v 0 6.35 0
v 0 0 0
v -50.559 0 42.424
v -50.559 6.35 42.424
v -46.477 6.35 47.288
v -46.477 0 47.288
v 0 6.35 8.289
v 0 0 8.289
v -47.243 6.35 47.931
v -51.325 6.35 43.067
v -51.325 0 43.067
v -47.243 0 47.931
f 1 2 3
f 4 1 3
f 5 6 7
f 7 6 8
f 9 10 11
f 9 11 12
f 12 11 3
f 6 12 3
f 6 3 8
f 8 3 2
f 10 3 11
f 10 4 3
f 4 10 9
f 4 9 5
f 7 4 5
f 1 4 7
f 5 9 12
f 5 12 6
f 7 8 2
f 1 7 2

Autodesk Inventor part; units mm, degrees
ref_plane "YZ Plane" through (0, 0, 0) normal (1, 0, 0) x (0, 1, 0)
ref_plane "XZ Plane" through (0, 0, 0) normal (0, 1, 0) x (-1, 0, 0)
ref_plane "XY Plane" through (0, 0, 0) normal (0, 0, 1) x (1, 0, 0)
sketch "Sketch1" plane through (0, 0, 0) normal (0, 1, 0) x (-1, 0, 0)
  line L0 (0, 0) -> (58.9854, 49.4946)
  line L1 (0, 0) -> (77, 0) construction
  line L2 (58.9854, 49.4946) -> (54.9037, 54.359)
  line L3 (54.9037, 54.359) -> (0, 8.2893)
  line L4 (0, 8.2893) -> (0, 0)
  dimension "d0" = 77
  dimension "d1" = 40
  dimension "d2" = 6.35
extrude "Extrusion1" add sketch "Sketch1" along normal blind 6.35
sketch "Sketch2" plane through (0, 6.35, 0) normal (0, 1, 0) x (1, 0, 0)
  line L0 (-58.9854, -49.4946) -> (-54.9037, -54.359) projected
  line L1 (-54.9037, -54.359) -> (-58.9854, -49.4946)
  line L2 (-58.9854, -49.4946) -> (-53.6231, -44.9951)
  line L3 (0, 0) -> (-58.9854, -49.4946) projected
  line L4 (-54.9037, -54.359) -> (0, -8.2893) projected
  line L5 (-49.5414, -49.8595) -> (-54.9037, -54.359)
  line L6 (-49.5414, -49.8595) -> (-46.4772, -47.2884)
  line L7 (-46.4772, -47.2884) -> (-50.5589, -42.424)
  line L8 (-50.5589, -42.424) -> (-58.9854, -49.4946)
  dimension "d5" = 7
  dimension "d6" = 4
extrude "Extrusion2" cut sketch "Sketch2" against normal blind 10
sketch "Sketch3" plane through (0, 6.35, 0) normal (0, 1, 0) x (1, 0, 0)
  line L0 (0, 0) -> (-50.5589, -42.424) projected
  line L1 (-50.5589, -42.424) -> (-51.325, -43.0668)
  line L2 (-51.325, -43.0668) -> (-47.2433, -47.9312)
  line L3 (-46.4772, -47.2884) -> (0, -8.2893) projected
  line L4 (-47.2433, -47.9312) -> (-46.4772, -47.2884)
  line L5 (-46.4772, -47.2884) -> (-50.5589, -42.424)
  dimension "d9" = 1
  dimension "d10" = 6.35
extrude "Extrusion3" add sketch "Sketch3" against normal blind 6.35
properties part number "2ndFloorOAngle"
